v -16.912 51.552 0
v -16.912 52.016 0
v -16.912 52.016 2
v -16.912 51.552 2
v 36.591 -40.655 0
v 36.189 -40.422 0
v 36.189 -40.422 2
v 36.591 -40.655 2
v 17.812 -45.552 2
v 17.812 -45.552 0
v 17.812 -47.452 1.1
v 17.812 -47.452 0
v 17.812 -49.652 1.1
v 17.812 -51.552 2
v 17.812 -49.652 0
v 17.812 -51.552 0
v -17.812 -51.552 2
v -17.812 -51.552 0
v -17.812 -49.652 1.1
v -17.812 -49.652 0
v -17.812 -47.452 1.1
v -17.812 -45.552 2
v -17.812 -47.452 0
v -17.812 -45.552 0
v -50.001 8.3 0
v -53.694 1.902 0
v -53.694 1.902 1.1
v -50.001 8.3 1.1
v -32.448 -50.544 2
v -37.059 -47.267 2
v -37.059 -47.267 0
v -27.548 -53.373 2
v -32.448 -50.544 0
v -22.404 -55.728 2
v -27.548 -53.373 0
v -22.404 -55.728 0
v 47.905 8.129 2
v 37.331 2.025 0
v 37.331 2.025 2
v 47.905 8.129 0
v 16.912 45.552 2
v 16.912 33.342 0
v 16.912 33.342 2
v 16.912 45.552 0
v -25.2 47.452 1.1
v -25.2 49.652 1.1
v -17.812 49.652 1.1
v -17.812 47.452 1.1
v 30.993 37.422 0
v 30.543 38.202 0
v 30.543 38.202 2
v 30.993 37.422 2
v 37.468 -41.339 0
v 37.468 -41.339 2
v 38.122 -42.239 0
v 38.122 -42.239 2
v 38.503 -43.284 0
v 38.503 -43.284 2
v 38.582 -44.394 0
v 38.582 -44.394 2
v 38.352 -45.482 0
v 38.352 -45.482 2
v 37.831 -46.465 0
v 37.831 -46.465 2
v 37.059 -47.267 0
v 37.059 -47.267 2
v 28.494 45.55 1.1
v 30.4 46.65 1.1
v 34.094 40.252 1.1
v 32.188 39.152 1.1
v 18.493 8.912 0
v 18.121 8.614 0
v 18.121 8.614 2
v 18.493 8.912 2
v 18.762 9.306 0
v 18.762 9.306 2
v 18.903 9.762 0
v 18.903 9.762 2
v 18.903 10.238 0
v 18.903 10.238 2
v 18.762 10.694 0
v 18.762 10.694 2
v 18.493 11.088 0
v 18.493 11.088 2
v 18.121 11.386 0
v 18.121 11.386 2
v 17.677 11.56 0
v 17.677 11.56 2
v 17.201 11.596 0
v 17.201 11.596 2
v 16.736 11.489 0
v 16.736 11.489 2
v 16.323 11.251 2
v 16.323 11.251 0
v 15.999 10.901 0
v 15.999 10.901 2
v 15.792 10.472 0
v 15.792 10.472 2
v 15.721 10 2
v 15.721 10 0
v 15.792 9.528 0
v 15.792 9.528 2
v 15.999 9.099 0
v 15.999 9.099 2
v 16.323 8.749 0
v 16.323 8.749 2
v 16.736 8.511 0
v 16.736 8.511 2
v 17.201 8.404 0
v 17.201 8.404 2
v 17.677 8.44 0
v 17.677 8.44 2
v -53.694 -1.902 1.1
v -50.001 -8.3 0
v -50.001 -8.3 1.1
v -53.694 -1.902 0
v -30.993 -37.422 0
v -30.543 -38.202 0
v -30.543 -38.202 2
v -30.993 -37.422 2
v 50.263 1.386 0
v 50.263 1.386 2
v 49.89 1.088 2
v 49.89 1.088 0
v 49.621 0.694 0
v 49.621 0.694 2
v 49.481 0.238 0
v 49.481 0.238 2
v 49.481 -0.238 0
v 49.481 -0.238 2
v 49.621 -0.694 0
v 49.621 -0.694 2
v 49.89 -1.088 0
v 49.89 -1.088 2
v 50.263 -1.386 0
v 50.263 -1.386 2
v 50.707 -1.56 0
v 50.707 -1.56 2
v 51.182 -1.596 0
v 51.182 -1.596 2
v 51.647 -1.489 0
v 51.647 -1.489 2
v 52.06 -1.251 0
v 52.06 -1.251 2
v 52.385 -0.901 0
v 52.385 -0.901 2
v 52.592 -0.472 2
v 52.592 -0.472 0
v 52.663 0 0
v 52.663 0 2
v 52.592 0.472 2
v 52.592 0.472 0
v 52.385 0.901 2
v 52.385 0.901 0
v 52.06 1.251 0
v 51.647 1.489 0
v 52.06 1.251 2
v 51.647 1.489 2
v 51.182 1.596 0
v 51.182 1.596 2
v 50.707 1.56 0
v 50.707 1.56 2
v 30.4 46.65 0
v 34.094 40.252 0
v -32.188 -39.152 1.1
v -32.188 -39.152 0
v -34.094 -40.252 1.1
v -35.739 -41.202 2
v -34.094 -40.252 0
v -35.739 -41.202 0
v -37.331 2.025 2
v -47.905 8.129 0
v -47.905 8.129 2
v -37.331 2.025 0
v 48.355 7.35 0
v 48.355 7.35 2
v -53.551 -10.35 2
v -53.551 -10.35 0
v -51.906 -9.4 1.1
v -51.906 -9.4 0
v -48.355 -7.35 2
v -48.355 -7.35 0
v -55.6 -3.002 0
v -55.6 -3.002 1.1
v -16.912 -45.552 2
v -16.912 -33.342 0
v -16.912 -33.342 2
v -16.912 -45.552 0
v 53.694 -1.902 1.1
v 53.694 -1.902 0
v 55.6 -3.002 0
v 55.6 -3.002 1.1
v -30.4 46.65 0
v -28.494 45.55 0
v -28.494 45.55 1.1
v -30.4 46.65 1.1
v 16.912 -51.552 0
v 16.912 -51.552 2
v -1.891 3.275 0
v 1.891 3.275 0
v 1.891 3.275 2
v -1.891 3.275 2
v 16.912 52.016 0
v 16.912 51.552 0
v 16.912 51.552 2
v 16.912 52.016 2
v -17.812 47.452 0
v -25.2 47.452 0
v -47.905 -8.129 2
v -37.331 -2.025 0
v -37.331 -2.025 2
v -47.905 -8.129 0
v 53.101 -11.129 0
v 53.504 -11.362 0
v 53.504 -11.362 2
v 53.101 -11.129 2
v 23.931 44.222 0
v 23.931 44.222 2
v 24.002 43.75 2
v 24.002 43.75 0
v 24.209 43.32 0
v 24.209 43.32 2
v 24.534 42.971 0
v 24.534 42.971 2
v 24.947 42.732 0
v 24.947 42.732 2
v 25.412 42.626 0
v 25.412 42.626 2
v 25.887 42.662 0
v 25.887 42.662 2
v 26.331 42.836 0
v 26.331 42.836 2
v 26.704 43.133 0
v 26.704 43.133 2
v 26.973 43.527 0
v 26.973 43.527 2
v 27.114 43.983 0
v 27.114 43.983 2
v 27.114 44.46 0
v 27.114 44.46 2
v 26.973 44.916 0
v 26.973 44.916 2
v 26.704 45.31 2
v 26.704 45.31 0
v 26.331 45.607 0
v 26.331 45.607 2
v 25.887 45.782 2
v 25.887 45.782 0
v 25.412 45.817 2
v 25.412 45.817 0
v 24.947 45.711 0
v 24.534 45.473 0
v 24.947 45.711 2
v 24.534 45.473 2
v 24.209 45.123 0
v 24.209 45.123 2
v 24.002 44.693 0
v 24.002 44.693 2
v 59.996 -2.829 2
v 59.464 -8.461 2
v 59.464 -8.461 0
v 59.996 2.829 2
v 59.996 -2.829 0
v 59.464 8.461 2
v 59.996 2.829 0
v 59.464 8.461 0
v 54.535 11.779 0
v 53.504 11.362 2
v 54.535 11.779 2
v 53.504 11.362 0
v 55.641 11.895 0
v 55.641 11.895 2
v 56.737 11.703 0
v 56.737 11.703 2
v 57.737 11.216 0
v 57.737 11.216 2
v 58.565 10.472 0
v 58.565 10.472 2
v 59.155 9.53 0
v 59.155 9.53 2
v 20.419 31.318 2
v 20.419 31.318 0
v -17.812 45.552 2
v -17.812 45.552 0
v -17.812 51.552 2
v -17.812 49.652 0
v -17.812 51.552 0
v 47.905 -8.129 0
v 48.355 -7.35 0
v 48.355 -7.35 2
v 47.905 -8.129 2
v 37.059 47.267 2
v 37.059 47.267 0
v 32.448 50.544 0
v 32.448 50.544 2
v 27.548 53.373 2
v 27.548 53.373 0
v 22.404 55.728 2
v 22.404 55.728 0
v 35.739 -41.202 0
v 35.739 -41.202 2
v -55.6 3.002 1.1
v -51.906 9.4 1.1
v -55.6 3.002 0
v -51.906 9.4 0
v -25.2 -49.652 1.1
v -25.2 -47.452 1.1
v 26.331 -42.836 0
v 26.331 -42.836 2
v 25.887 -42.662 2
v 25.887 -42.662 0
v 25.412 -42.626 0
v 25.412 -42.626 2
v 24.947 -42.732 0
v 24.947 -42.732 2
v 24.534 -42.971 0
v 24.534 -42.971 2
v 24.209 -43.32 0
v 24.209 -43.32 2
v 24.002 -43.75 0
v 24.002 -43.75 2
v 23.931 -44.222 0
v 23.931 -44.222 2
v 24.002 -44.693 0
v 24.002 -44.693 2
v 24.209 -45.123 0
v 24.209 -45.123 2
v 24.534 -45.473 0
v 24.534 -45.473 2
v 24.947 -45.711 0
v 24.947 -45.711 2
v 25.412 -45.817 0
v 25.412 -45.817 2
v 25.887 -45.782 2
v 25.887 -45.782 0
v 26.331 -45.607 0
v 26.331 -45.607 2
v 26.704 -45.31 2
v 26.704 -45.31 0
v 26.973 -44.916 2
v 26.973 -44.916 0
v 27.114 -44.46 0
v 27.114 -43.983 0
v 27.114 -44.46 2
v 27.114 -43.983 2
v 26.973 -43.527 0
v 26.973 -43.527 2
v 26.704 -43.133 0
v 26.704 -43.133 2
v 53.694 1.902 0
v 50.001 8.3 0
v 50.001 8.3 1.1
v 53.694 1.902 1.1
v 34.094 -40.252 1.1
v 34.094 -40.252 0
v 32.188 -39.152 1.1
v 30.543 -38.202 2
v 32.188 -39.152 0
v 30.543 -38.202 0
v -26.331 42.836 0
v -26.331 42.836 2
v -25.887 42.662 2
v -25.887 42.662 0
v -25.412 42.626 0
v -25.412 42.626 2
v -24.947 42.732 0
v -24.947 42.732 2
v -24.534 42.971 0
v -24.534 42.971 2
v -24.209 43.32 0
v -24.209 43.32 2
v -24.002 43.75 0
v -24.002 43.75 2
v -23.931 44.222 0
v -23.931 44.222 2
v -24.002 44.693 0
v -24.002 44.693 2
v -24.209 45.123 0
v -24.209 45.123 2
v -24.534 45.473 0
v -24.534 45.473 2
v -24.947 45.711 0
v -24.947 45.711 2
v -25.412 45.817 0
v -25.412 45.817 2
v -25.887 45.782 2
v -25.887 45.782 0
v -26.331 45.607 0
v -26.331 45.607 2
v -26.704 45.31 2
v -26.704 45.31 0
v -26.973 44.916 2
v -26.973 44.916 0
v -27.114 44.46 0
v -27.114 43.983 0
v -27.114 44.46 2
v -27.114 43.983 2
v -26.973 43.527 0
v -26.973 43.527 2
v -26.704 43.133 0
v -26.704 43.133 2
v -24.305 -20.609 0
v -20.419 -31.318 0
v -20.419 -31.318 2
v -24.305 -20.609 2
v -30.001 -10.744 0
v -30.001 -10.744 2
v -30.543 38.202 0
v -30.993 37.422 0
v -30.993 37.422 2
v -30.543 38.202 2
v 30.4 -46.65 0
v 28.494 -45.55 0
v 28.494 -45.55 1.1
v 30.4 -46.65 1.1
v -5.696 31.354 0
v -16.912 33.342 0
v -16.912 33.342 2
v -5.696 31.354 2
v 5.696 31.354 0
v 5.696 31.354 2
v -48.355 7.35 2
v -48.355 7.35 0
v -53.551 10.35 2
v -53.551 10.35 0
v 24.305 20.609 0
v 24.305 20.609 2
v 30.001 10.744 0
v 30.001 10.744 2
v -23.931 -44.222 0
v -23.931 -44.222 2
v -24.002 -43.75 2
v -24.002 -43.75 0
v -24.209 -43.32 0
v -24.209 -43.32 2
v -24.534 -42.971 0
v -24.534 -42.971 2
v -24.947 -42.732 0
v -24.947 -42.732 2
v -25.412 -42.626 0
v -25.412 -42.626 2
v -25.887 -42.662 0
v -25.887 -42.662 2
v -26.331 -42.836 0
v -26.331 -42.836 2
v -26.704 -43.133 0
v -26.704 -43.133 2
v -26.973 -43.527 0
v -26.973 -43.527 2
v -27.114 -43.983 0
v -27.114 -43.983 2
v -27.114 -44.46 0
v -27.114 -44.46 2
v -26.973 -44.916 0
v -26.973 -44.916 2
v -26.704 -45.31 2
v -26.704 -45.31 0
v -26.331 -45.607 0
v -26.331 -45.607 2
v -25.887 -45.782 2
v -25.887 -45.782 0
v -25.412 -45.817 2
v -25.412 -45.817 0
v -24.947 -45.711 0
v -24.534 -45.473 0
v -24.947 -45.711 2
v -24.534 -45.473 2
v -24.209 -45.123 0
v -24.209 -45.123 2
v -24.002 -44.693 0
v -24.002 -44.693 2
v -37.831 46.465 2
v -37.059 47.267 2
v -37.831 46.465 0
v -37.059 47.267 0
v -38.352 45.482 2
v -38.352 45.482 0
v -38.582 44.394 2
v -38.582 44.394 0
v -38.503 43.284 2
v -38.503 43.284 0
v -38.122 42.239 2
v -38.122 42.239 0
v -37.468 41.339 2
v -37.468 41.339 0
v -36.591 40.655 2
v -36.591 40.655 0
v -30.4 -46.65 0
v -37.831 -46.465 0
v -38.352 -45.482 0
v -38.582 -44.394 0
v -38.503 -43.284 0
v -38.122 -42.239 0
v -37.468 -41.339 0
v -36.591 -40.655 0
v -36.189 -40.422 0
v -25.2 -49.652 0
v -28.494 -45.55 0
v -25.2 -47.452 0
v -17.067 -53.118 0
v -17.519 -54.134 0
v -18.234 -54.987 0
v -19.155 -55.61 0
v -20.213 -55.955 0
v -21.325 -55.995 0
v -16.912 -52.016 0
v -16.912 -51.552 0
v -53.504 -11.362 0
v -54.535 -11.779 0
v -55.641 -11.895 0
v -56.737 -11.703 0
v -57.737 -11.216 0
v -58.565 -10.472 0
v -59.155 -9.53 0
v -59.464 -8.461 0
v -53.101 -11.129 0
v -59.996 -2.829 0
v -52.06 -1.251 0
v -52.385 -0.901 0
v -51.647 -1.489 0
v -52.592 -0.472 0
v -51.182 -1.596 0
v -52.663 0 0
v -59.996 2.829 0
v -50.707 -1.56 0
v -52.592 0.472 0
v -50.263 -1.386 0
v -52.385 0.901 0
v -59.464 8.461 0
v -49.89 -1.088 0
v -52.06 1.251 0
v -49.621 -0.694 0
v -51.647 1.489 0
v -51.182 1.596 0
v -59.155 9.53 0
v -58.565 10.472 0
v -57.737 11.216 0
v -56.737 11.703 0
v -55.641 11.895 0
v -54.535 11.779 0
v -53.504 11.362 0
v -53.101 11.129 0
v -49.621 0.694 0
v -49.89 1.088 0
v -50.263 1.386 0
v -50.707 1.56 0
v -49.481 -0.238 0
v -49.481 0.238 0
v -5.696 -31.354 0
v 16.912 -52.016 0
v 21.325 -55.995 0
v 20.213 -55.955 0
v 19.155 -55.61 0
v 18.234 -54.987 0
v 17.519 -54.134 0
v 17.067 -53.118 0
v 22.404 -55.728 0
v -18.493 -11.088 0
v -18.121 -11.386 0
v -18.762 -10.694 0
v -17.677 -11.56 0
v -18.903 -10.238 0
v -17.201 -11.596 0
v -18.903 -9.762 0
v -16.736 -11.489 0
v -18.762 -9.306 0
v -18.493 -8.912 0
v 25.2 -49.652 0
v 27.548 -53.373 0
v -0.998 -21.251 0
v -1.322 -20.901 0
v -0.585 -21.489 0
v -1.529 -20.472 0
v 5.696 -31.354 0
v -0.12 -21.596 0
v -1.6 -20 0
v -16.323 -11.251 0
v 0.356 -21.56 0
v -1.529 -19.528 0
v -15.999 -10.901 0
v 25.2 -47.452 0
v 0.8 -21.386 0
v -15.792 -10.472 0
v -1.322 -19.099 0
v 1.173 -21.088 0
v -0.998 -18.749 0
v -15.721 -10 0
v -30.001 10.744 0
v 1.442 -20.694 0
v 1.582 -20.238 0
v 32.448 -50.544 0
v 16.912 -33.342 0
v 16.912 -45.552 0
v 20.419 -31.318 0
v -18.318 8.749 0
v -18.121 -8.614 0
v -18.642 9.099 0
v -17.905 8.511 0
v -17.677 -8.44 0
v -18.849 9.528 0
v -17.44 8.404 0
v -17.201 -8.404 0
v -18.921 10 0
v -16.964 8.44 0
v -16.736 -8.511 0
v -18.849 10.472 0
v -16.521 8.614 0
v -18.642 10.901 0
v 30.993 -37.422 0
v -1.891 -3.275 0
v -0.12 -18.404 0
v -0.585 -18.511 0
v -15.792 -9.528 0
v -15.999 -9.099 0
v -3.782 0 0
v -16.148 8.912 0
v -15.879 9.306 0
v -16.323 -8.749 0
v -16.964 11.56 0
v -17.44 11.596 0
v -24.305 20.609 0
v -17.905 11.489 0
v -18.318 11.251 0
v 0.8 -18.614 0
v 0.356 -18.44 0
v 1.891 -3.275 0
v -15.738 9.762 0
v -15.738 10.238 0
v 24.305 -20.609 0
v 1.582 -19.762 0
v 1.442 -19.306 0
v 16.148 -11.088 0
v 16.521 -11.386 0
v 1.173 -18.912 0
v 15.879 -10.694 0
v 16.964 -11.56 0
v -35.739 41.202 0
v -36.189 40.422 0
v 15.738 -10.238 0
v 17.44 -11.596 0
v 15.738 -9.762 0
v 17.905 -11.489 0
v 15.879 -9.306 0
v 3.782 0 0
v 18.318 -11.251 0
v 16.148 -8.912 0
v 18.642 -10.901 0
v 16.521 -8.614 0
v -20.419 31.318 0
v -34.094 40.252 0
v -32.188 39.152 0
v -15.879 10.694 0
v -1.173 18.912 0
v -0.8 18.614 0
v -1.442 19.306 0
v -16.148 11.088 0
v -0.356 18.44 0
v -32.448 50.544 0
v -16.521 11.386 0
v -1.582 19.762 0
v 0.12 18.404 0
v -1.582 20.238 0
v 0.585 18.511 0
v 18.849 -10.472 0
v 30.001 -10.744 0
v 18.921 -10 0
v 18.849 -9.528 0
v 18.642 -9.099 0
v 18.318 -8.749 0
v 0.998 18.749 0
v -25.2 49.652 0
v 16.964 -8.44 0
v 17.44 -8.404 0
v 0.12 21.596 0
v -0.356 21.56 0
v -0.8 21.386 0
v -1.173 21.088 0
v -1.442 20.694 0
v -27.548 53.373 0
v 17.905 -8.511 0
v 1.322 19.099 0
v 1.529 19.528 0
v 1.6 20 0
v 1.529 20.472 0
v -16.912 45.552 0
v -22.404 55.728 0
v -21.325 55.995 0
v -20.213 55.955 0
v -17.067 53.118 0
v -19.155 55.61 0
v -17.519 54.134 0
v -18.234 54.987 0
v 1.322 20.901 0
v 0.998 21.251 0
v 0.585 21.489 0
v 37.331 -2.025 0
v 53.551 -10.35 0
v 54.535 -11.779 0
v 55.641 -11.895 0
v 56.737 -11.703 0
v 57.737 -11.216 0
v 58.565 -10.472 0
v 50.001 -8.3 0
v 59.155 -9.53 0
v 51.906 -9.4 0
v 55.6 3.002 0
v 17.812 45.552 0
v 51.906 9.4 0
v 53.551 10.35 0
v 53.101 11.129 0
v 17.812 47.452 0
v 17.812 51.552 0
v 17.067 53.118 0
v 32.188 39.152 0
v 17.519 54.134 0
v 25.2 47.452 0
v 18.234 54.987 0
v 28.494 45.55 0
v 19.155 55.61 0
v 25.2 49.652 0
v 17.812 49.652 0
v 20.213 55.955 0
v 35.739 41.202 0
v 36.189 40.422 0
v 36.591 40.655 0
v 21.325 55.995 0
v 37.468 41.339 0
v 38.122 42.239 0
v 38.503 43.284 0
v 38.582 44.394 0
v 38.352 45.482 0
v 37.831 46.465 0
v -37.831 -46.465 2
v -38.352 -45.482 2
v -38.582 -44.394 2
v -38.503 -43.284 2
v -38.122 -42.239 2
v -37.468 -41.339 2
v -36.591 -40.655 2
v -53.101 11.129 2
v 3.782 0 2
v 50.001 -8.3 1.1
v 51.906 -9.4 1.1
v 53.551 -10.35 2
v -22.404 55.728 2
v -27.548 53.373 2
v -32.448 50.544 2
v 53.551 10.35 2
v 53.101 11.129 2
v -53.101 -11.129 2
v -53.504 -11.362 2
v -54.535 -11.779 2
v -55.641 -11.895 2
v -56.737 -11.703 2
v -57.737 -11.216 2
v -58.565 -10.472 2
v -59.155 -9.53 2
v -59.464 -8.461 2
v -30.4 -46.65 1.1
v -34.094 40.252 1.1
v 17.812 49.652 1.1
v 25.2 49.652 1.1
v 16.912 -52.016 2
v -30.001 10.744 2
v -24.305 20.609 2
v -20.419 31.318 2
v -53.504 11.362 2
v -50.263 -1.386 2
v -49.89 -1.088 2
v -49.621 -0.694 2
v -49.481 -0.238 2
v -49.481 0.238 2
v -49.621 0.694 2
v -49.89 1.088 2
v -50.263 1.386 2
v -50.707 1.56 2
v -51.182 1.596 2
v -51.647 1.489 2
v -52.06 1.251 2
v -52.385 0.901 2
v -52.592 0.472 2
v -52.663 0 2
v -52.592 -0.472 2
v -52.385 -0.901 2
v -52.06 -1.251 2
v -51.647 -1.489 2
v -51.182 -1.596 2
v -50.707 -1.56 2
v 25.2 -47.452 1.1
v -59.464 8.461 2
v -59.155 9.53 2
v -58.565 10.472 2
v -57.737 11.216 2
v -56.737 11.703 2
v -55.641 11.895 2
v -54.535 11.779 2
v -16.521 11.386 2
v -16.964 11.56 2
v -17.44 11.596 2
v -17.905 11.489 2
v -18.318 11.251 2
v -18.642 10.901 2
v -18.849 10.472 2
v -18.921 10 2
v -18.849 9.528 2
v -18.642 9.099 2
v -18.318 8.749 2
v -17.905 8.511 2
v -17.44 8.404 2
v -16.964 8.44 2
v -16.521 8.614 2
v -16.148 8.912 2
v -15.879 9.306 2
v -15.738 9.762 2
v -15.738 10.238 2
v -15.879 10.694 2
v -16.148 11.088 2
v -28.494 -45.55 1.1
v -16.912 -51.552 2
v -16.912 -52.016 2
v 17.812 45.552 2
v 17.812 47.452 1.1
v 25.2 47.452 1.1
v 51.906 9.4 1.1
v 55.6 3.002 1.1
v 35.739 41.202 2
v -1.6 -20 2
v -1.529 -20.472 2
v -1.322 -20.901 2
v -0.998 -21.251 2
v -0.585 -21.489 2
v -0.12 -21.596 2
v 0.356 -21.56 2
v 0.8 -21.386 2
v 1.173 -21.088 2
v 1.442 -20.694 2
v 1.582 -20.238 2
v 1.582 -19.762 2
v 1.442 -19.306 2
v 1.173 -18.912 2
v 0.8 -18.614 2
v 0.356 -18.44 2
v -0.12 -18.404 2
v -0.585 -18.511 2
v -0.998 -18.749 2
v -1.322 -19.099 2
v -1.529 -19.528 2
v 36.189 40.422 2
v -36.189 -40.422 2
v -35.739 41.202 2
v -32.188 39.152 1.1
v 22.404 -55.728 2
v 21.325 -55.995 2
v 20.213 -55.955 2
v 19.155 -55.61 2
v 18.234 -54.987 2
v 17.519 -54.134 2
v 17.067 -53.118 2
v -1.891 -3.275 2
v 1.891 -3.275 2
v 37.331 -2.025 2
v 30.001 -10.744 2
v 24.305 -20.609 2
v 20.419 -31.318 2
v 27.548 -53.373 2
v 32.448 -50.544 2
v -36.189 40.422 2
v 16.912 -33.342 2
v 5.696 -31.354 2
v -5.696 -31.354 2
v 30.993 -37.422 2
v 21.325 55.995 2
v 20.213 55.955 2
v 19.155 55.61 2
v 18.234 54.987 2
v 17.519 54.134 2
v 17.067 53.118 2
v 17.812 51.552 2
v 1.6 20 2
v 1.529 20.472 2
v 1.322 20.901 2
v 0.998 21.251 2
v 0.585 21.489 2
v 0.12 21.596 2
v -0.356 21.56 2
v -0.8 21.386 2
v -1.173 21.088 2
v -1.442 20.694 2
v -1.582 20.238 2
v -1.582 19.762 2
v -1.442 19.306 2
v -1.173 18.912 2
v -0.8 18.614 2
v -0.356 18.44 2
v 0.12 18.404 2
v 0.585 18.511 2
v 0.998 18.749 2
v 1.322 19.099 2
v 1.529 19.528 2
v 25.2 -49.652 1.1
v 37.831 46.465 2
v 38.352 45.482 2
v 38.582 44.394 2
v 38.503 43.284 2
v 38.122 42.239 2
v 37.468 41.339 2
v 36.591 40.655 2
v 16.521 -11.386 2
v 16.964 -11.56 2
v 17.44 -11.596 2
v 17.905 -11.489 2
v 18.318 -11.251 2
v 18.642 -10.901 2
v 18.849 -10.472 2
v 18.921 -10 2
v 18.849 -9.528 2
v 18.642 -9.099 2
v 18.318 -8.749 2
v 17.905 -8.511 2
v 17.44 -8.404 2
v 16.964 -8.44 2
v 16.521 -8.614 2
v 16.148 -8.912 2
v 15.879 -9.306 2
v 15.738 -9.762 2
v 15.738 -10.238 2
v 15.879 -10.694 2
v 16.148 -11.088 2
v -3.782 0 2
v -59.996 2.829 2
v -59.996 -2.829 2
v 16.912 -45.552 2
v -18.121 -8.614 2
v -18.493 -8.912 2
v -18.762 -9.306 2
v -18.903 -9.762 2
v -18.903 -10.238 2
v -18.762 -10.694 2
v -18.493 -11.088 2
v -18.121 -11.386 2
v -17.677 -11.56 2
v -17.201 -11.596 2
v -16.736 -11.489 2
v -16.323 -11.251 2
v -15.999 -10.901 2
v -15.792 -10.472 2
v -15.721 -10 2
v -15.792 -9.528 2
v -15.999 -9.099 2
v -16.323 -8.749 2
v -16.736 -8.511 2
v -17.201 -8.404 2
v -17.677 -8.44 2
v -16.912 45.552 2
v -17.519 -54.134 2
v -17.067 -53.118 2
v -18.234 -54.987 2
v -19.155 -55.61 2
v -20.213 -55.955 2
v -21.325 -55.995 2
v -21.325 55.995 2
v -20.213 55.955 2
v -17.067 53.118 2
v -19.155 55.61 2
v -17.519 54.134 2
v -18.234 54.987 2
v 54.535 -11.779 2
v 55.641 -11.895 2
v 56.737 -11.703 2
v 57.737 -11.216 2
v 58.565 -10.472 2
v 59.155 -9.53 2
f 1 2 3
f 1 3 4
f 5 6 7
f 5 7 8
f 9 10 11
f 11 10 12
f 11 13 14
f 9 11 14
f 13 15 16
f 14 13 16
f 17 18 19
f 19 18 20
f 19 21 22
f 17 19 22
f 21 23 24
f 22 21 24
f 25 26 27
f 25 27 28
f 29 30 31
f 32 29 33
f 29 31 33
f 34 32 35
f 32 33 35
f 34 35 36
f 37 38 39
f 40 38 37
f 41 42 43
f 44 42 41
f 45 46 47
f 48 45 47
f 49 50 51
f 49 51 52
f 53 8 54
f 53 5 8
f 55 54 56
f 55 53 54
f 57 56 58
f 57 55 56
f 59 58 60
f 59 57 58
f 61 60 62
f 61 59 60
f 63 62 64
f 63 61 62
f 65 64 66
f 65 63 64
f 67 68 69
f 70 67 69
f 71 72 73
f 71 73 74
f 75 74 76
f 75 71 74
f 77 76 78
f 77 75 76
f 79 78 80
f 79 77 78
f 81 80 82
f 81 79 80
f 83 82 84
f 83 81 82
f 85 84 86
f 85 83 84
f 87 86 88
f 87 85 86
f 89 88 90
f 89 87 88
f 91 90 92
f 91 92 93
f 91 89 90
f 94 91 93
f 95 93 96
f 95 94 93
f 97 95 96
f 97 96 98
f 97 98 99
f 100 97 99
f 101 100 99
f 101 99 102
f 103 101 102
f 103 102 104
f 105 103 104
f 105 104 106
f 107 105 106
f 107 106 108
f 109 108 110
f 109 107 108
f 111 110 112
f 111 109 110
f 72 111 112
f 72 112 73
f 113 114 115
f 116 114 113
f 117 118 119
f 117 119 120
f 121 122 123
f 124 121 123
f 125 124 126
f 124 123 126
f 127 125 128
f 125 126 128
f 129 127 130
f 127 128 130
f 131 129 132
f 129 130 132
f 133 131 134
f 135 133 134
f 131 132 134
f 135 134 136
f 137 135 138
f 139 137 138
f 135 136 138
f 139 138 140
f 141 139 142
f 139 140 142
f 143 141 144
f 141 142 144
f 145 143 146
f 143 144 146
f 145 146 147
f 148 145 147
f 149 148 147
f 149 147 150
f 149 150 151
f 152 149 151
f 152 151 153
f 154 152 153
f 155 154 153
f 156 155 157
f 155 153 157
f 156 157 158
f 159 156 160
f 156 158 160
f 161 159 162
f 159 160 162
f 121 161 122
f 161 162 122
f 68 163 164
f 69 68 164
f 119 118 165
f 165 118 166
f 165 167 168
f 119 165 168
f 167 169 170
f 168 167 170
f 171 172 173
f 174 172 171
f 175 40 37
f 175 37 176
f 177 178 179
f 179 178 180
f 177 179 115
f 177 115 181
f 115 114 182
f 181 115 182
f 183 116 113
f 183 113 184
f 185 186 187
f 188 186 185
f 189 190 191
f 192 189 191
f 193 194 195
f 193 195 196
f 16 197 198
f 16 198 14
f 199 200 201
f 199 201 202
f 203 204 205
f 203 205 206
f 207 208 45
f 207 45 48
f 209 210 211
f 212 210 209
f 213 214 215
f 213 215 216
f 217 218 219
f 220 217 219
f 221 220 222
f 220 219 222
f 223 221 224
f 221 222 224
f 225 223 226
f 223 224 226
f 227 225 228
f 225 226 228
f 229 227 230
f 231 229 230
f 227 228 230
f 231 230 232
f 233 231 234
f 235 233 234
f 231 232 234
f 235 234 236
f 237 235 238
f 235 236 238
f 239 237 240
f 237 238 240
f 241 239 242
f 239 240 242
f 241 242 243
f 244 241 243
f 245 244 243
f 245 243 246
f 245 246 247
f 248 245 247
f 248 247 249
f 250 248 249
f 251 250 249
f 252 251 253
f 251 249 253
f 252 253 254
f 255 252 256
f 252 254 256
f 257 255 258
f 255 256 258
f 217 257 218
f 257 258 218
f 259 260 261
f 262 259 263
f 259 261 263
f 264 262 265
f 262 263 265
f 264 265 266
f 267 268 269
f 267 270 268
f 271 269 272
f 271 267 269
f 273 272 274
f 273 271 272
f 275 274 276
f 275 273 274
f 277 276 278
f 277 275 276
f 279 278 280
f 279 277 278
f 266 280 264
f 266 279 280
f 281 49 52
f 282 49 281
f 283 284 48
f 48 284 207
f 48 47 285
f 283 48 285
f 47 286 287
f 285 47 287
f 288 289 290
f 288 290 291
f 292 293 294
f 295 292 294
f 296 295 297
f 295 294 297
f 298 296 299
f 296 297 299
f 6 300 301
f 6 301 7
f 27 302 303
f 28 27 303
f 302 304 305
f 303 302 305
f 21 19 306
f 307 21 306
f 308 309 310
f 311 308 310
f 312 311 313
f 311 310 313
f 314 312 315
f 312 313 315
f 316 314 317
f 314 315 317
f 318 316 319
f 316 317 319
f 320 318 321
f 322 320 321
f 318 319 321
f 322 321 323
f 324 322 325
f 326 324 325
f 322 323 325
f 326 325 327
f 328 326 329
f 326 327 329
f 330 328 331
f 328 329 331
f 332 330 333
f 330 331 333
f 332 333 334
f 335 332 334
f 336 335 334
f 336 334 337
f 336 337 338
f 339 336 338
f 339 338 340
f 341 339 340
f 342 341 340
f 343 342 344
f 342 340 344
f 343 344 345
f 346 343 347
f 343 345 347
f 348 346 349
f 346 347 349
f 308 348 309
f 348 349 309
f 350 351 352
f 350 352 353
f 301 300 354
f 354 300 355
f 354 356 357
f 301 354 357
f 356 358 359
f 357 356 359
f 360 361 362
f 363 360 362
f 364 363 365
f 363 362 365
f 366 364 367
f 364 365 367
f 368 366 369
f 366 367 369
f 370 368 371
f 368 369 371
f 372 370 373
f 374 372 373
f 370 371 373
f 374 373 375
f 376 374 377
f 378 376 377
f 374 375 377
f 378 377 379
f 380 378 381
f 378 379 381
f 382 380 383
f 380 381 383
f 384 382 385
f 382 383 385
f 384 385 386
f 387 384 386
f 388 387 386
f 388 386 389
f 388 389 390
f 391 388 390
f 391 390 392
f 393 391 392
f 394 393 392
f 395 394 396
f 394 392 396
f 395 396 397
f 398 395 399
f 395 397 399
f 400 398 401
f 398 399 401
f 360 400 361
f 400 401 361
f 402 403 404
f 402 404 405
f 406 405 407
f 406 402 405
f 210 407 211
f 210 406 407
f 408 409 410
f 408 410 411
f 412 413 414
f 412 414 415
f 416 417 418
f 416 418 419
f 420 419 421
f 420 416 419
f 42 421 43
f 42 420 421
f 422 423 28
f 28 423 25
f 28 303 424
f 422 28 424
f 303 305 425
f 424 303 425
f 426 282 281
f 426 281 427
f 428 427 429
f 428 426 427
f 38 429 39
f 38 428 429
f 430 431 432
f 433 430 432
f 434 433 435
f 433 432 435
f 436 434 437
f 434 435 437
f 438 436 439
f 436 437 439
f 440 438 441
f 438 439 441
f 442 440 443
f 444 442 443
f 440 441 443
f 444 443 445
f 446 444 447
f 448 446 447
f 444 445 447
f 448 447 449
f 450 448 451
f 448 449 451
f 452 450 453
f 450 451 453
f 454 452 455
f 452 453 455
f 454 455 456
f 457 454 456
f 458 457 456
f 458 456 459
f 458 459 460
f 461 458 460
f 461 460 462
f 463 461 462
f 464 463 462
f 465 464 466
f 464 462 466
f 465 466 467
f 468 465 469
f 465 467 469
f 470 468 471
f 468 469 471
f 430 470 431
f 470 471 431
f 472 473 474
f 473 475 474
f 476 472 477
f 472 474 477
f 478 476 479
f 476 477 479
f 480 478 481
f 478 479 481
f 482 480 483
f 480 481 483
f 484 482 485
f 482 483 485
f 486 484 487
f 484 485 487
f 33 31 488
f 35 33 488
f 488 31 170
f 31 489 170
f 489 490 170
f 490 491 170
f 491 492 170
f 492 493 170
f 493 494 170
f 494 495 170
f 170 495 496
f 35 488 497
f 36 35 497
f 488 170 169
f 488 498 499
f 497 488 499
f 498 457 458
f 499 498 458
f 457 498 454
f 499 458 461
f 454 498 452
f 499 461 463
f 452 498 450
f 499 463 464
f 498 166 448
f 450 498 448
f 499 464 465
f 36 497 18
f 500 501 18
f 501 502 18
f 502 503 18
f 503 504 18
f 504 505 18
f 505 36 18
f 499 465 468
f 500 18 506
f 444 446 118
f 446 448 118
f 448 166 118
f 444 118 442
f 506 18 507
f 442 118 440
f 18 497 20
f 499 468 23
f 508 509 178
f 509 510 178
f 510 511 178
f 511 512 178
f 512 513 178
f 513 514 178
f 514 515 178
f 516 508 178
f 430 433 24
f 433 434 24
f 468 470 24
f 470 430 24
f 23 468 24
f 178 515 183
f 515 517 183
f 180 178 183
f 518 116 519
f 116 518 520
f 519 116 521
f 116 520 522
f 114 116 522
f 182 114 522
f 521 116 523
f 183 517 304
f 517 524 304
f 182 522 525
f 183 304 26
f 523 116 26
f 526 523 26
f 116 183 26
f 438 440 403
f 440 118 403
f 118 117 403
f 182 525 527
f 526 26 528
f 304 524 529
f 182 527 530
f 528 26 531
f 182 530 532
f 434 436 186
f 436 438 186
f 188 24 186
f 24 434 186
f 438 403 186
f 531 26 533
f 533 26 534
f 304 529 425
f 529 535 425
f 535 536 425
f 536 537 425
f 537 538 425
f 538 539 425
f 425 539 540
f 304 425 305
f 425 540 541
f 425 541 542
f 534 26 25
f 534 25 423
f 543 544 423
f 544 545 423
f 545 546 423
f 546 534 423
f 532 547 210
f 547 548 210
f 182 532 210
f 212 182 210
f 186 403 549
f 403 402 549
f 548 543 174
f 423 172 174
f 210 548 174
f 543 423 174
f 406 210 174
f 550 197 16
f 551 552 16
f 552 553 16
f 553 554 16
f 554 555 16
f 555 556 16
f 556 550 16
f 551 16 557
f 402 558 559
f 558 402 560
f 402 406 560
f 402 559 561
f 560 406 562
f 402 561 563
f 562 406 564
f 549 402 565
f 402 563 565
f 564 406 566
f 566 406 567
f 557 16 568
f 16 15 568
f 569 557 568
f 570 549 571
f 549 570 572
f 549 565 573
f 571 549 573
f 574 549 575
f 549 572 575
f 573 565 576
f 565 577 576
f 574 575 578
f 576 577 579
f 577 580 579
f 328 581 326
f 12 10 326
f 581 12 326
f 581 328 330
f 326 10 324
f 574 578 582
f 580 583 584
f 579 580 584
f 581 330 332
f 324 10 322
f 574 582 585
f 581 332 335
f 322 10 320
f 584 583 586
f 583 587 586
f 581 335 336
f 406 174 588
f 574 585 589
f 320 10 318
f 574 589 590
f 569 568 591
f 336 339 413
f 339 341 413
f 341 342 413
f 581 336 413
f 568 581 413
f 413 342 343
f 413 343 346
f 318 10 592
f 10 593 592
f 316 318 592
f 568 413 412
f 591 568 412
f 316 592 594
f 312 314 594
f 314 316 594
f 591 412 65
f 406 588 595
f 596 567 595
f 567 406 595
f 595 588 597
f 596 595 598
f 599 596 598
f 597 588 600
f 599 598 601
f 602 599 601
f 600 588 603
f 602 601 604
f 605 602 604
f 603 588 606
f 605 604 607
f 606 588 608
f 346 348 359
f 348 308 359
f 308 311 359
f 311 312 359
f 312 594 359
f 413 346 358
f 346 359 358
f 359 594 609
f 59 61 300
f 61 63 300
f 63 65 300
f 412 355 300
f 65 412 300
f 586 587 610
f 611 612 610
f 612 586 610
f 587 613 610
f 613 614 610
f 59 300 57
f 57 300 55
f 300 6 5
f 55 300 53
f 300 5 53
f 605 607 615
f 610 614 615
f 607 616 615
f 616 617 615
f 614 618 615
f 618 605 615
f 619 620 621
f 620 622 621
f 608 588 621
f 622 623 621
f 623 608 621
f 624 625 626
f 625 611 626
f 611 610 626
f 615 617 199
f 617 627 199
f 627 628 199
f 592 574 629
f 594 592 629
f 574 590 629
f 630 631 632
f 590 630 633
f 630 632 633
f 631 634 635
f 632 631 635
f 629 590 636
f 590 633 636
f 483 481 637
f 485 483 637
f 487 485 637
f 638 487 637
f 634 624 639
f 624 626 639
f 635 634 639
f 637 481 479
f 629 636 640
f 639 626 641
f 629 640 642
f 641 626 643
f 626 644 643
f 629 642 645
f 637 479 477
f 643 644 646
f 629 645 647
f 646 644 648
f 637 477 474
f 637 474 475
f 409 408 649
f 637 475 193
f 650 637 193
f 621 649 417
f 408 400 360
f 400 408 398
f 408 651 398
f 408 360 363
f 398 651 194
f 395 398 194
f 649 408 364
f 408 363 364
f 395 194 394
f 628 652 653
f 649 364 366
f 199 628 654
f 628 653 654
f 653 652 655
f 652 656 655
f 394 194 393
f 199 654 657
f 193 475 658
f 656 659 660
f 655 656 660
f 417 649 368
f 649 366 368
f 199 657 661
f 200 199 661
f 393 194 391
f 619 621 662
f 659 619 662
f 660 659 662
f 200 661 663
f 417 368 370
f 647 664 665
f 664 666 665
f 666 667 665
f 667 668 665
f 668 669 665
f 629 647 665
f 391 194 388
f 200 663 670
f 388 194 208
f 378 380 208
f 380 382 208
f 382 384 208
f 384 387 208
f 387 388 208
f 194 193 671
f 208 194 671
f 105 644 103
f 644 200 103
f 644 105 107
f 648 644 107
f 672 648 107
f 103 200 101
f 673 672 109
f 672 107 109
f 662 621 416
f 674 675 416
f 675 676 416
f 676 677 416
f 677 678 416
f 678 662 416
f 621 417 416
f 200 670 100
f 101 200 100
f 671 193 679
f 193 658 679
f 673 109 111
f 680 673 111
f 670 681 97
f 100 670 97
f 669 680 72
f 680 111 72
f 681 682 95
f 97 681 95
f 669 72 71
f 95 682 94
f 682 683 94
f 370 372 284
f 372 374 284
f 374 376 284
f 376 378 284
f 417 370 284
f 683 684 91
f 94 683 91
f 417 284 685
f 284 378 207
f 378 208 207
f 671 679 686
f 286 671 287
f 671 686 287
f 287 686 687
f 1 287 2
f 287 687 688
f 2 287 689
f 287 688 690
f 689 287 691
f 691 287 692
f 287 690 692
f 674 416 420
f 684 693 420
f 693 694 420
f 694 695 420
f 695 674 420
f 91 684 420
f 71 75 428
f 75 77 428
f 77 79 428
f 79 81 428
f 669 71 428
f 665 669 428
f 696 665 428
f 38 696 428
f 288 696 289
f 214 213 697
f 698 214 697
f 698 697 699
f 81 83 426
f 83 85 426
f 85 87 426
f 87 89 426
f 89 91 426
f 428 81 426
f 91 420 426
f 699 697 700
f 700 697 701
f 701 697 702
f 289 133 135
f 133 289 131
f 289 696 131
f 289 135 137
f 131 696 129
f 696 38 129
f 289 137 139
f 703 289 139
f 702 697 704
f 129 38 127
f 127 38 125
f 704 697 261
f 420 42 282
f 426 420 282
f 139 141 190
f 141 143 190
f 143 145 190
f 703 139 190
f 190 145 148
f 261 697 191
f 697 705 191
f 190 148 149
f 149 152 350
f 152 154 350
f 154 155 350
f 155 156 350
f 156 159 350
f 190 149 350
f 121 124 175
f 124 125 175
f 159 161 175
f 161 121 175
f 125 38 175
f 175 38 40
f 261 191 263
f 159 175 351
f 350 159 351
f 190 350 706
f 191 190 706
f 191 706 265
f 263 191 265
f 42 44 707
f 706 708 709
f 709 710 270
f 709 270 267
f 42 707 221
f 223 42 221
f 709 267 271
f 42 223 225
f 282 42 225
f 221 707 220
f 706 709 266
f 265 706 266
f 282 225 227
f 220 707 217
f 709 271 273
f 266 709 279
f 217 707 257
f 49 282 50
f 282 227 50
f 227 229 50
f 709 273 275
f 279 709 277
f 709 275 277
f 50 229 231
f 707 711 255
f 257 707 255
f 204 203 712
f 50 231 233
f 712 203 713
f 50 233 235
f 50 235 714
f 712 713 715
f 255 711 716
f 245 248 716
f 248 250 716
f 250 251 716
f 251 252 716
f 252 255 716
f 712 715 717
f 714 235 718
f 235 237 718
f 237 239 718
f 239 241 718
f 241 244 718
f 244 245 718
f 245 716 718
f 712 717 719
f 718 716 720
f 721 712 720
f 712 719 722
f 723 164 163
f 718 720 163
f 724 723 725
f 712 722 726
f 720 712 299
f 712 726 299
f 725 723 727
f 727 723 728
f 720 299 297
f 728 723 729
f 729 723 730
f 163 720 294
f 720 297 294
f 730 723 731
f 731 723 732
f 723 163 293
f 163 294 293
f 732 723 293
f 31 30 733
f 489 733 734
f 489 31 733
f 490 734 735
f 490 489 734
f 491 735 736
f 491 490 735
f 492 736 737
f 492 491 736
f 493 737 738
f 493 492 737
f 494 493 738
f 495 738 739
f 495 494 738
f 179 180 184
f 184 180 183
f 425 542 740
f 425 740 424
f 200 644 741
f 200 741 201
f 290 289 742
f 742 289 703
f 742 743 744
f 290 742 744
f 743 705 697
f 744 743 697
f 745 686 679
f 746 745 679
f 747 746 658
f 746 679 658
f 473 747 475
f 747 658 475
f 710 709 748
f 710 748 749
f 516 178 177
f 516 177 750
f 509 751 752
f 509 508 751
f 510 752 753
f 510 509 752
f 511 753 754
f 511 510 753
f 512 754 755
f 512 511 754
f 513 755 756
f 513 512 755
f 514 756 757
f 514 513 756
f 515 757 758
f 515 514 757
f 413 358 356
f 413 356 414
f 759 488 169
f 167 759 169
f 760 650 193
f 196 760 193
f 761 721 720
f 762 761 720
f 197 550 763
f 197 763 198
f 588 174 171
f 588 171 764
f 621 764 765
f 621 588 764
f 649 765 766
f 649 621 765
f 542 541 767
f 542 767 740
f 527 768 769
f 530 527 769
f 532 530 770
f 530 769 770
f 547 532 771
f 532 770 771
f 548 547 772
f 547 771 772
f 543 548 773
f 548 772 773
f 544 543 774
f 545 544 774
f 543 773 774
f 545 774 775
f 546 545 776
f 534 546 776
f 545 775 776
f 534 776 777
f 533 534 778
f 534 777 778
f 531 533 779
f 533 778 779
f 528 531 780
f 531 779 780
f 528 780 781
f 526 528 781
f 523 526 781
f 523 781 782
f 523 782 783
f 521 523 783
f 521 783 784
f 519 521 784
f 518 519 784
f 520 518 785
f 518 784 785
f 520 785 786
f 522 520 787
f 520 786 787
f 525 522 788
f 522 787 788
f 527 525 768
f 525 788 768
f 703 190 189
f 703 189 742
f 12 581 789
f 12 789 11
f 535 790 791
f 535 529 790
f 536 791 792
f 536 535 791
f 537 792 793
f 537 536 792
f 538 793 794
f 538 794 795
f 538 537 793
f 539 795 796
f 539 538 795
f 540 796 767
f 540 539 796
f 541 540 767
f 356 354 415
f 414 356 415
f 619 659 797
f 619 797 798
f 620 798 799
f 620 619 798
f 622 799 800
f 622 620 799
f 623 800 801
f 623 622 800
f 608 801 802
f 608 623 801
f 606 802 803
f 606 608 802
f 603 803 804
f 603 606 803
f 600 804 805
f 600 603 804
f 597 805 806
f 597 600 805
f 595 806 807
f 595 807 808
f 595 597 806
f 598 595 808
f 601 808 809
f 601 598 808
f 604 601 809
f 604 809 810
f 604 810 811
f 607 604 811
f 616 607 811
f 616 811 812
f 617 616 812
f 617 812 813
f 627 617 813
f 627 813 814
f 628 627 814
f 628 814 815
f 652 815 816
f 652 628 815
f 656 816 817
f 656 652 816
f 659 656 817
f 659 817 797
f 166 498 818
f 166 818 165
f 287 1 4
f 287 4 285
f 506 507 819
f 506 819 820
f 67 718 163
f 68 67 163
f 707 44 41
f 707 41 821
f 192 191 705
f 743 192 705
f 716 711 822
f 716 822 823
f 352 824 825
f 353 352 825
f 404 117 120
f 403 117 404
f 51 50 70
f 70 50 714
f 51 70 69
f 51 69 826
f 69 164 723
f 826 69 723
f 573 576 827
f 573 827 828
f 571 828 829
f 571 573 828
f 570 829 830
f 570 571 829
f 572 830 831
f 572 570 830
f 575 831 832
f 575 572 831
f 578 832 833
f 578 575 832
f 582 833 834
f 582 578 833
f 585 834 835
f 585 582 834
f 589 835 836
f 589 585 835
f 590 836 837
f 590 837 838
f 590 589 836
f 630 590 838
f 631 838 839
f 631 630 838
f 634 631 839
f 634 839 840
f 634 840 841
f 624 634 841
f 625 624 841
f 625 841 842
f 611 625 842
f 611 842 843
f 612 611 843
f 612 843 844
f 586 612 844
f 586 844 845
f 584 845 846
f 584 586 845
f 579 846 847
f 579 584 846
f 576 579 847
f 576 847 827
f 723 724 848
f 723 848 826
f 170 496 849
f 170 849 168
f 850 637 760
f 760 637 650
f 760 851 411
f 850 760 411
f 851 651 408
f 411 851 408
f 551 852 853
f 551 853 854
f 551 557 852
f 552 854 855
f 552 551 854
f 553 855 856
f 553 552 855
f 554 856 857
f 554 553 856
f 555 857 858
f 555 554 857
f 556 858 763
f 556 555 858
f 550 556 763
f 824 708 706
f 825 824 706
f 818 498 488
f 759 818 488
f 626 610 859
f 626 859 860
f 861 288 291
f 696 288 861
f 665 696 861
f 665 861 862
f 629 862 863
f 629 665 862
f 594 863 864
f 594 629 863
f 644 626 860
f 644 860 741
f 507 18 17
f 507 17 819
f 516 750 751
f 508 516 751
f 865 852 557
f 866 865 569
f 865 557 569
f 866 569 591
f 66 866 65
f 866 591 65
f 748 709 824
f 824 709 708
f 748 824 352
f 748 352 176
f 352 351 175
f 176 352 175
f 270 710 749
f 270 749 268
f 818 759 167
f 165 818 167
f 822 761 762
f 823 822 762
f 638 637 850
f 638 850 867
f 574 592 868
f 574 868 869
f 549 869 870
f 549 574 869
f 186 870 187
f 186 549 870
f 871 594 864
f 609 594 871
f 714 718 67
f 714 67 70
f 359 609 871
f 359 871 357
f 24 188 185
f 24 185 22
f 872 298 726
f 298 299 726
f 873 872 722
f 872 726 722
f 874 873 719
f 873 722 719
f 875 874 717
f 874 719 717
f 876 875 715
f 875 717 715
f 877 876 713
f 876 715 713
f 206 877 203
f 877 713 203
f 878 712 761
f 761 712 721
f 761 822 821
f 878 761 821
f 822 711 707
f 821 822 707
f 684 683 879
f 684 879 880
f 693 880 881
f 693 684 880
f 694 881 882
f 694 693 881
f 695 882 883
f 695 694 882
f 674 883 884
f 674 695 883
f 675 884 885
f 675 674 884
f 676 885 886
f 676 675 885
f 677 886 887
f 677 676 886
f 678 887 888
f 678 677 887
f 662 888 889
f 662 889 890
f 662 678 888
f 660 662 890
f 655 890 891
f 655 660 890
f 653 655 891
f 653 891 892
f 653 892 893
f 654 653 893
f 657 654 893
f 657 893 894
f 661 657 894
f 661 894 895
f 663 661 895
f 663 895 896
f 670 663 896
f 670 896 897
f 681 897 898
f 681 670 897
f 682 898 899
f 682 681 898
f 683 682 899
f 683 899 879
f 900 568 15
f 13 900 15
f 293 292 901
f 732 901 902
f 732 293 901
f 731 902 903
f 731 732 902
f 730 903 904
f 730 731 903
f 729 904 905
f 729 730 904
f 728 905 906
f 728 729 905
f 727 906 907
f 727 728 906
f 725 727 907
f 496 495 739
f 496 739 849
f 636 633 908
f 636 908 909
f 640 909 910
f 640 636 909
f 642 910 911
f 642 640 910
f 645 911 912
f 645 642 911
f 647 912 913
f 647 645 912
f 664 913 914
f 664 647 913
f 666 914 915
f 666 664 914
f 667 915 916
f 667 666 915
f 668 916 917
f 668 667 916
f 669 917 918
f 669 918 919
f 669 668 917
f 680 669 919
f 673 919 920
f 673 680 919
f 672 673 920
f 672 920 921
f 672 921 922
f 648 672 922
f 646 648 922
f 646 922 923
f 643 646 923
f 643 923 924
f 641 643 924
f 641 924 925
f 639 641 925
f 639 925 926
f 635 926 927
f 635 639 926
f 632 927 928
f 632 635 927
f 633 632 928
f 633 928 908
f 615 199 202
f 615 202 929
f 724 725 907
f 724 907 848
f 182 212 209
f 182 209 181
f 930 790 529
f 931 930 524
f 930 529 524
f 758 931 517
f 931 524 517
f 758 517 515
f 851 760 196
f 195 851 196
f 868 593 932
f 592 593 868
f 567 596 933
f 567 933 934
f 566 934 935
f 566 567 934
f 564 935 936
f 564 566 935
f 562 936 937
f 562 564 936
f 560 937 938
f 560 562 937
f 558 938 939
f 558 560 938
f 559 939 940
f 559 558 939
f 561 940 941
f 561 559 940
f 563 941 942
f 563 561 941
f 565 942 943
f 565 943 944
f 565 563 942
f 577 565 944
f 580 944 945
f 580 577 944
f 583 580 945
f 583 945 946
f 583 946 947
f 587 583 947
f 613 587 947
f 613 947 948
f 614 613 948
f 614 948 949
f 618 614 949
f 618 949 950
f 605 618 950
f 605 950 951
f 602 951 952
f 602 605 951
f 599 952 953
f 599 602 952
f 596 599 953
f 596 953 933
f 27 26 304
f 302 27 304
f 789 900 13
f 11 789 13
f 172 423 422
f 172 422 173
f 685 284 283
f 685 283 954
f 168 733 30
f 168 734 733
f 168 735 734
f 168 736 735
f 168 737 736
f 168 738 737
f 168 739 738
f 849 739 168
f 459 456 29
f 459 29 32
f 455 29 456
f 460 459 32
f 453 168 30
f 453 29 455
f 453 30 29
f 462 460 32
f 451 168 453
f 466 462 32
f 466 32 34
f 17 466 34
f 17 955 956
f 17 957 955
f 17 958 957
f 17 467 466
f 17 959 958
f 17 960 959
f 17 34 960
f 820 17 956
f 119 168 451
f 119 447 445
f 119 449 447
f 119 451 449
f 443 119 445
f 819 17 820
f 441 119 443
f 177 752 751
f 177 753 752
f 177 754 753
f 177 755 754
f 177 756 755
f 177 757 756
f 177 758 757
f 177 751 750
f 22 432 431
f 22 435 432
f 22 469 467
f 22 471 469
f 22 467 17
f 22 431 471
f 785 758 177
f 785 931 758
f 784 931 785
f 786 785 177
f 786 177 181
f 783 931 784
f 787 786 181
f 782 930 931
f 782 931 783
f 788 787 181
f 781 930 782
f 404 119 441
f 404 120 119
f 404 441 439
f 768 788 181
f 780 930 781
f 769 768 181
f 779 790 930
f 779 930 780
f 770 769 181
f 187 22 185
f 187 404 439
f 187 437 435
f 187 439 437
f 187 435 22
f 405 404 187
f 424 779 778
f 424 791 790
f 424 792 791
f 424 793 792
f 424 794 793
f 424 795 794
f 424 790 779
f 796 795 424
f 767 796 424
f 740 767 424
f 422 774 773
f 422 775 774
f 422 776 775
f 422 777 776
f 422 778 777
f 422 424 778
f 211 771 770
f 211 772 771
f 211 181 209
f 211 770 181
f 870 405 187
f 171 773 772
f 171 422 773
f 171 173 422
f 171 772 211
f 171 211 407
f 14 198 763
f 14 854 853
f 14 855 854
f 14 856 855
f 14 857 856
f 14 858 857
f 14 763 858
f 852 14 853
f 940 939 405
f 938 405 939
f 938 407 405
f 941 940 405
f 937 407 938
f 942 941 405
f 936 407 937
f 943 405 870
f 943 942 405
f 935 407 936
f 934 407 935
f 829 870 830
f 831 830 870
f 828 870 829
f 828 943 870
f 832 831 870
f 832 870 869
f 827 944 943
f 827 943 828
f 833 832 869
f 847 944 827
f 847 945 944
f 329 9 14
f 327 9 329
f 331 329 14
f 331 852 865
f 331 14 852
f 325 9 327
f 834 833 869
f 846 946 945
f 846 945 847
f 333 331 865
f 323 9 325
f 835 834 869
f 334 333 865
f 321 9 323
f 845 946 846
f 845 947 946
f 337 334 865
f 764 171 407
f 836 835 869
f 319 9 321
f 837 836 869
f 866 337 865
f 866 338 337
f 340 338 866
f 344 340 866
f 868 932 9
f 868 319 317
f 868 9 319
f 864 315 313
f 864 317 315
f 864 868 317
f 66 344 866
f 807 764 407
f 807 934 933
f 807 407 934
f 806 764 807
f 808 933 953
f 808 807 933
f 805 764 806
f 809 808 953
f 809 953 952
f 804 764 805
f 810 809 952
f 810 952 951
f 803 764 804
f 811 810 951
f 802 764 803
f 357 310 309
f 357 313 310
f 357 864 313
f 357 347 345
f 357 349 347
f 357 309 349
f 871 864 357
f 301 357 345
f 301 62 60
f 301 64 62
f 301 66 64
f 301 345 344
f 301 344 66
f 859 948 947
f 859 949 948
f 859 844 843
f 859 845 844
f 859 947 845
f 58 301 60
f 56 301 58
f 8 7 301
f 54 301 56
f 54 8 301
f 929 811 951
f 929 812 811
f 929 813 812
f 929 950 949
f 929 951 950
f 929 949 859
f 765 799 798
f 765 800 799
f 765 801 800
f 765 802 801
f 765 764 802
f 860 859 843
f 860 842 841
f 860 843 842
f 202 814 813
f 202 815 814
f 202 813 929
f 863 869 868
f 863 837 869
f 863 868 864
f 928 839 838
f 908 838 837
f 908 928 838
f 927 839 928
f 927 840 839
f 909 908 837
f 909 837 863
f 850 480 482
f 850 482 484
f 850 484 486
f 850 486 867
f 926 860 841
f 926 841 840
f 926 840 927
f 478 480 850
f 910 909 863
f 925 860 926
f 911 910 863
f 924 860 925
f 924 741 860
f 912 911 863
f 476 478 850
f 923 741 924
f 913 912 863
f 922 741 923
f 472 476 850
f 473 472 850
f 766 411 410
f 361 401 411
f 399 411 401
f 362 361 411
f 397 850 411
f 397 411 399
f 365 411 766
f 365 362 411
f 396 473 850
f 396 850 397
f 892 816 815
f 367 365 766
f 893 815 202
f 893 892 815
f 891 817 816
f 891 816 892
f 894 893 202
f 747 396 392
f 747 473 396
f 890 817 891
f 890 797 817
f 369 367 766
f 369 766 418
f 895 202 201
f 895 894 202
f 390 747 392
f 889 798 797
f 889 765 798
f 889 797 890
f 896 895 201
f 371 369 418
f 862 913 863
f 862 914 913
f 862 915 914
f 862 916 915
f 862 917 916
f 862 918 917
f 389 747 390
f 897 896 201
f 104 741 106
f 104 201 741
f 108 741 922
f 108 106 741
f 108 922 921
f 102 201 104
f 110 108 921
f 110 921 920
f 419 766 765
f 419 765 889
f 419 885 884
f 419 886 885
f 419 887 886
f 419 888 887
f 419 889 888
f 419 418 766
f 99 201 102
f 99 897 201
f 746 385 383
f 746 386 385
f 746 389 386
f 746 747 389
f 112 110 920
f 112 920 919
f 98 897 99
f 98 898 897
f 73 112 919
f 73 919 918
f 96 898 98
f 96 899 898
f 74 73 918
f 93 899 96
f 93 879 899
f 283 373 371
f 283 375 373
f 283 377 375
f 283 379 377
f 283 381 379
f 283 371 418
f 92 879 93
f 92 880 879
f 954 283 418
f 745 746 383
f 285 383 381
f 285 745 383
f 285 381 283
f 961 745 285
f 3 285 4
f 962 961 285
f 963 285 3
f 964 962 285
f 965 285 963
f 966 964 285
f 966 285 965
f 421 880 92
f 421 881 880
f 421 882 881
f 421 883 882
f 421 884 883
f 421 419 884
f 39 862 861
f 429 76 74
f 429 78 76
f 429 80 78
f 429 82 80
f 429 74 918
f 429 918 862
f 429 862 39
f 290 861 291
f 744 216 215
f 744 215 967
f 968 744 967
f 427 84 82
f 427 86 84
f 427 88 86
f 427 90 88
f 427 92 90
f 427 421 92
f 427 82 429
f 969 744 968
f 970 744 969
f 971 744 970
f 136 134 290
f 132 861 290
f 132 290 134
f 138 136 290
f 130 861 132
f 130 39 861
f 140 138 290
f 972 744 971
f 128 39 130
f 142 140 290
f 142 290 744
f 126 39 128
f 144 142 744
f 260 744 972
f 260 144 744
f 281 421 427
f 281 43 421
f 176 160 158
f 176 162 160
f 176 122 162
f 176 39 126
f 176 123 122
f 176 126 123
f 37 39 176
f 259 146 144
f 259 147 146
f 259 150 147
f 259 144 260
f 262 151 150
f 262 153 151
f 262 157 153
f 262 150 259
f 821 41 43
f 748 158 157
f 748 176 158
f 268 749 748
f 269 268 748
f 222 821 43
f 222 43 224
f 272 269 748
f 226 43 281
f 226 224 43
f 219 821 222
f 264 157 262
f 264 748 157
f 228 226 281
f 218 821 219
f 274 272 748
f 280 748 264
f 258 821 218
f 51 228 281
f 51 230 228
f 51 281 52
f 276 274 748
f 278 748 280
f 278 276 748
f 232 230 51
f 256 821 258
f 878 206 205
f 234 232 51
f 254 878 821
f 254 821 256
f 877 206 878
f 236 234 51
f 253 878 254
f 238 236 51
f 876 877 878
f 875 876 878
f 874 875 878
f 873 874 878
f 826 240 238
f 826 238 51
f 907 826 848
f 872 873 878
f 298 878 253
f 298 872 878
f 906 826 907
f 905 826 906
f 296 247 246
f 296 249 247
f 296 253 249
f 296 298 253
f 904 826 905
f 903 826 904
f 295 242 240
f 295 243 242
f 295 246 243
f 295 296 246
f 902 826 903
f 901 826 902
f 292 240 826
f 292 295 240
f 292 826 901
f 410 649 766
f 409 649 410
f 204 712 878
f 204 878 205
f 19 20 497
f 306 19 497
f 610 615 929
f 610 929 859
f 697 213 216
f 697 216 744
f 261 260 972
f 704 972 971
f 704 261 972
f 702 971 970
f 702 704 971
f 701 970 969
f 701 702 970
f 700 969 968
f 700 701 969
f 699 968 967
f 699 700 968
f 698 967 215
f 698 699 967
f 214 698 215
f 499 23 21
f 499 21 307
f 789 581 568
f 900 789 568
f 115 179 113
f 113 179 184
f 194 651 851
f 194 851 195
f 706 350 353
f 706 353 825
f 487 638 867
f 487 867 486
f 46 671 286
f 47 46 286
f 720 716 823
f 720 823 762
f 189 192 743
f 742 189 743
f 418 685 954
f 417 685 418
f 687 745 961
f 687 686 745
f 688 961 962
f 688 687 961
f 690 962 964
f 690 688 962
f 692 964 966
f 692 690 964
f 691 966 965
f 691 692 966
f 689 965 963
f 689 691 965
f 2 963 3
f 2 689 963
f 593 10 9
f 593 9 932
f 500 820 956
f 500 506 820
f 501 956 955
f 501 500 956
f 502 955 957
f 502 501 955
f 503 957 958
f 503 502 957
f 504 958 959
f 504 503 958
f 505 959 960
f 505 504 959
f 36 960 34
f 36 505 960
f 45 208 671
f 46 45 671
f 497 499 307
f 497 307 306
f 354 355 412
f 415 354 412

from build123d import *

# Parameters (mm, degrees)
SKETCH3_R                = 60.062756644
DISK_DEPTH               = 2
SKETCH4_W                = 50.4
SKETCH4_H                = 2.2
AXLE_DEPTH               = 1.1
ROLLER_REACH             = 86.965
WASHER_REACH             = 86.965
FILLET1_R                = 4
CIRPATTERN1_COUNT        = 6
FILLET1_OF_CIRPATTERN1_R = 4
ROLLER_SCREW_REACH       = 84.155
SKETCH9_R                = 1.6
CIRPATTERN3_COUNT        = 6
HEX_AXLE_REACH           = 84.155
HUB_SCREWS_REACH         = 84.155
SKETCH11_R               = 1.6
CIRPATTERN4_COUNT        = 6


with BuildPart() as part:
    # Sketch3 → Disk (new body)
    with BuildSketch(Plane.XY):
        Circle(SKETCH3_R)
    extrude(amount=DISK_DEPTH)

    # Sketch4 → Axle (cut)
    with BuildSketch(Plane.XY):
        with Locations((0, 48.55177146)):
            Rectangle(SKETCH4_W, SKETCH4_H)
    axle = extrude(amount=AXLE_DEPTH, mode=Mode.SUBTRACT)

    # Sketch7 → Roller (cut, up to next)
    with BuildSketch(Plane.XY, mode=Mode.PRIVATE) as roller_sk1:
        with BuildLine():
            Line((16.912362698, 62.893833964), (-16.912362698, 62.893833964))
            Line((-16.912362698, 62.893833964), (-16.912362698, 33.342312944))
            ThreePointArc((-16.912362698, 33.342312944), (0, 31.103542919), (16.912362698, 33.342312944))
            Line((16.912362698, 33.342312944), (16.912362698, 62.893833964))
        make_face()
    roller_tool1 = extrude(roller_sk1.sketch, amount=ROLLER_REACH, mode=Mode.PRIVATE) & part.part
    roller = roller_tool1.solids().sort_by_distance((0, 47.36207, 0))[0]
    add(roller, mode=Mode.SUBTRACT)

    # Sketch8 → Washer (cut, up to next)
    with BuildSketch(Plane.XY, mode=Mode.PRIVATE) as washer_sk1:
        Polygon((-17.812362698, 51.55177146), (-16.912362698, 51.55177146), (-16.412362698, 51.55177146), (-16.412362698, 45.55177146), (-16.912362698, 45.55177146), (-17.812362698, 45.55177146), align=None)
    washer_tool1 = extrude(washer_sk1.sketch, amount=WASHER_REACH, mode=Mode.PRIVATE) & part.part
    # Sketch8 → Washer (cut, up to next)
    with BuildSketch(Plane.XY, mode=Mode.PRIVATE) as washer_sk2:
        Polygon((17.812362698, 51.55177146), (17.812362698, 45.55177146), (16.912362698, 45.55177146), (16.412362698, 45.55177146), (16.412362698, 51.55177146), (16.912362698, 51.55177146), align=None)
    washer_tool2 = extrude(washer_sk2.sketch, amount=WASHER_REACH, mode=Mode.PRIVATE) & part.part
    washer_1 = washer_tool1.solids().sort_by_distance((-17.112363, 48.551771, 0))[0]
    add(washer_1, mode=Mode.SUBTRACT)
    washer_2 = washer_tool2.solids().sort_by_distance((17.112363, 48.551771, 0))[0]
    add(washer_2, mode=Mode.SUBTRACT)
    washer = washer_1 + washer_2  # Washer as one shape, for the pattern or mirror that repeats it

    # Fillet1
    fillet1_edges = [part.edges().sort_by_distance(p)[0] for p in [
        (16.912362698, 57.632514466, 1),
        (-16.912362698, 57.632514466, 1),
    ]]
    fillet(fillet1_edges, radius=FILLET1_R)

    # CirPattern1: Axle, Roller, Washer ×6 about axis
    cirpattern1_axis = Axis((0, 0, -6.491701274), (0, 0, 1))
    add([axle.rotate(cirpattern1_axis, i * 360 / CIRPATTERN1_COUNT) for i in range(1, CIRPATTERN1_COUNT)], mode=Mode.SUBTRACT)
    add([roller.rotate(cirpattern1_axis, i * 360 / CIRPATTERN1_COUNT) for i in range(1, CIRPATTERN1_COUNT)], mode=Mode.SUBTRACT)
    add([washer.rotate(cirpattern1_axis, i * 360 / CIRPATTERN1_COUNT) for i in range(1, CIRPATTERN1_COUNT)], mode=Mode.SUBTRACT)

    # Fillet1 of CirPattern1
    fillet1_of_cirpattern1_edges = [part.edges().sort_by_distance(p)[0] for p in [
        (-41.455040262, 43.462792967, 1),
        (-58.36740296, 14.169721499, 1),
        (-58.36740296, -14.169721499, 1),
        (-41.455040262, -43.462792967, 1),
        (-16.912362698, -57.632514466, 1),
        (16.912362698, -57.632514466, 1),
        (41.455040262, -43.462792967, 1),
        (58.36740296, -14.169721499, 1),
        (58.36740296, 14.169721499, 1),
        (41.455040262, 43.462792967, 1),
    ]]
    fillet(fillet1_of_cirpattern1_edges, radius=FILLET1_OF_CIRPATTERN1_R)

    # Sketch9 → Roller screw (cut, up to next)
    with BuildSketch(Plane.XY.offset(2), mode=Mode.PRIVATE) as roller_screw_sk1:
        with Locations((-25.531378322, -44.221644441)):
            Circle(SKETCH9_R)
    roller_screw_tool1 = extrude(roller_screw_sk1.sketch, amount=-ROLLER_SCREW_REACH, mode=Mode.PRIVATE) & part.part
    roller_screw = roller_screw_tool1.solids().sort_by_distance((-25.531378, -44.221644, 2))[0]
    add(roller_screw, mode=Mode.SUBTRACT)

    # CirPattern3: Roller screw ×6 about axis
    cirpattern3_axis = Axis((0, 0, -6.491701274), (0, 0, 1))
    for i in range(1, CIRPATTERN3_COUNT):
        add(roller_screw.rotate(cirpattern3_axis, i * 360 / CIRPATTERN3_COUNT), mode=Mode.SUBTRACT)

    # Sketch10 → Hex axle (cut, up to next)
    with BuildSketch(Plane.XY, mode=Mode.PRIVATE) as hex_axle_sk1:
        Polygon((3.781644263, 0), (1.890822132, 3.275), (-1.890822132, 3.275), (-3.781644263, 0), (-1.890822132, -3.275), (1.890822132, -3.275), align=None)
    hex_axle_tool1 = extrude(hex_axle_sk1.sketch, amount=HEX_AXLE_REACH, mode=Mode.PRIVATE) & part.part
    add(hex_axle_tool1.solids().sort_by_distance((0, 0, 0))[0], mode=Mode.SUBTRACT)

    # Sketch11 → Hub screws (cut, up to next)
    with BuildSketch(Plane.XY, mode=Mode.PRIVATE) as hub_screws_sk1:
        with Locations((0, 20)):
            Circle(SKETCH11_R)
    hub_screws_tool1 = extrude(hub_screws_sk1.sketch, amount=HUB_SCREWS_REACH, mode=Mode.PRIVATE) & part.part
    hub_screws = hub_screws_tool1.solids().sort_by_distance((0, 20, 0))[0]
    add(hub_screws, mode=Mode.SUBTRACT)

    # CirPattern4: Hub screws ×6 about axis
    cirpattern4_axis = Axis((0, 0, -6.491701274), (0, 0, 1))
    for i in range(1, CIRPATTERN4_COUNT):
        add(hub_screws.rotate(cirpattern4_axis, i * 360 / CIRPATTERN4_COUNT), mode=Mode.SUBTRACT)


solid = part.part
